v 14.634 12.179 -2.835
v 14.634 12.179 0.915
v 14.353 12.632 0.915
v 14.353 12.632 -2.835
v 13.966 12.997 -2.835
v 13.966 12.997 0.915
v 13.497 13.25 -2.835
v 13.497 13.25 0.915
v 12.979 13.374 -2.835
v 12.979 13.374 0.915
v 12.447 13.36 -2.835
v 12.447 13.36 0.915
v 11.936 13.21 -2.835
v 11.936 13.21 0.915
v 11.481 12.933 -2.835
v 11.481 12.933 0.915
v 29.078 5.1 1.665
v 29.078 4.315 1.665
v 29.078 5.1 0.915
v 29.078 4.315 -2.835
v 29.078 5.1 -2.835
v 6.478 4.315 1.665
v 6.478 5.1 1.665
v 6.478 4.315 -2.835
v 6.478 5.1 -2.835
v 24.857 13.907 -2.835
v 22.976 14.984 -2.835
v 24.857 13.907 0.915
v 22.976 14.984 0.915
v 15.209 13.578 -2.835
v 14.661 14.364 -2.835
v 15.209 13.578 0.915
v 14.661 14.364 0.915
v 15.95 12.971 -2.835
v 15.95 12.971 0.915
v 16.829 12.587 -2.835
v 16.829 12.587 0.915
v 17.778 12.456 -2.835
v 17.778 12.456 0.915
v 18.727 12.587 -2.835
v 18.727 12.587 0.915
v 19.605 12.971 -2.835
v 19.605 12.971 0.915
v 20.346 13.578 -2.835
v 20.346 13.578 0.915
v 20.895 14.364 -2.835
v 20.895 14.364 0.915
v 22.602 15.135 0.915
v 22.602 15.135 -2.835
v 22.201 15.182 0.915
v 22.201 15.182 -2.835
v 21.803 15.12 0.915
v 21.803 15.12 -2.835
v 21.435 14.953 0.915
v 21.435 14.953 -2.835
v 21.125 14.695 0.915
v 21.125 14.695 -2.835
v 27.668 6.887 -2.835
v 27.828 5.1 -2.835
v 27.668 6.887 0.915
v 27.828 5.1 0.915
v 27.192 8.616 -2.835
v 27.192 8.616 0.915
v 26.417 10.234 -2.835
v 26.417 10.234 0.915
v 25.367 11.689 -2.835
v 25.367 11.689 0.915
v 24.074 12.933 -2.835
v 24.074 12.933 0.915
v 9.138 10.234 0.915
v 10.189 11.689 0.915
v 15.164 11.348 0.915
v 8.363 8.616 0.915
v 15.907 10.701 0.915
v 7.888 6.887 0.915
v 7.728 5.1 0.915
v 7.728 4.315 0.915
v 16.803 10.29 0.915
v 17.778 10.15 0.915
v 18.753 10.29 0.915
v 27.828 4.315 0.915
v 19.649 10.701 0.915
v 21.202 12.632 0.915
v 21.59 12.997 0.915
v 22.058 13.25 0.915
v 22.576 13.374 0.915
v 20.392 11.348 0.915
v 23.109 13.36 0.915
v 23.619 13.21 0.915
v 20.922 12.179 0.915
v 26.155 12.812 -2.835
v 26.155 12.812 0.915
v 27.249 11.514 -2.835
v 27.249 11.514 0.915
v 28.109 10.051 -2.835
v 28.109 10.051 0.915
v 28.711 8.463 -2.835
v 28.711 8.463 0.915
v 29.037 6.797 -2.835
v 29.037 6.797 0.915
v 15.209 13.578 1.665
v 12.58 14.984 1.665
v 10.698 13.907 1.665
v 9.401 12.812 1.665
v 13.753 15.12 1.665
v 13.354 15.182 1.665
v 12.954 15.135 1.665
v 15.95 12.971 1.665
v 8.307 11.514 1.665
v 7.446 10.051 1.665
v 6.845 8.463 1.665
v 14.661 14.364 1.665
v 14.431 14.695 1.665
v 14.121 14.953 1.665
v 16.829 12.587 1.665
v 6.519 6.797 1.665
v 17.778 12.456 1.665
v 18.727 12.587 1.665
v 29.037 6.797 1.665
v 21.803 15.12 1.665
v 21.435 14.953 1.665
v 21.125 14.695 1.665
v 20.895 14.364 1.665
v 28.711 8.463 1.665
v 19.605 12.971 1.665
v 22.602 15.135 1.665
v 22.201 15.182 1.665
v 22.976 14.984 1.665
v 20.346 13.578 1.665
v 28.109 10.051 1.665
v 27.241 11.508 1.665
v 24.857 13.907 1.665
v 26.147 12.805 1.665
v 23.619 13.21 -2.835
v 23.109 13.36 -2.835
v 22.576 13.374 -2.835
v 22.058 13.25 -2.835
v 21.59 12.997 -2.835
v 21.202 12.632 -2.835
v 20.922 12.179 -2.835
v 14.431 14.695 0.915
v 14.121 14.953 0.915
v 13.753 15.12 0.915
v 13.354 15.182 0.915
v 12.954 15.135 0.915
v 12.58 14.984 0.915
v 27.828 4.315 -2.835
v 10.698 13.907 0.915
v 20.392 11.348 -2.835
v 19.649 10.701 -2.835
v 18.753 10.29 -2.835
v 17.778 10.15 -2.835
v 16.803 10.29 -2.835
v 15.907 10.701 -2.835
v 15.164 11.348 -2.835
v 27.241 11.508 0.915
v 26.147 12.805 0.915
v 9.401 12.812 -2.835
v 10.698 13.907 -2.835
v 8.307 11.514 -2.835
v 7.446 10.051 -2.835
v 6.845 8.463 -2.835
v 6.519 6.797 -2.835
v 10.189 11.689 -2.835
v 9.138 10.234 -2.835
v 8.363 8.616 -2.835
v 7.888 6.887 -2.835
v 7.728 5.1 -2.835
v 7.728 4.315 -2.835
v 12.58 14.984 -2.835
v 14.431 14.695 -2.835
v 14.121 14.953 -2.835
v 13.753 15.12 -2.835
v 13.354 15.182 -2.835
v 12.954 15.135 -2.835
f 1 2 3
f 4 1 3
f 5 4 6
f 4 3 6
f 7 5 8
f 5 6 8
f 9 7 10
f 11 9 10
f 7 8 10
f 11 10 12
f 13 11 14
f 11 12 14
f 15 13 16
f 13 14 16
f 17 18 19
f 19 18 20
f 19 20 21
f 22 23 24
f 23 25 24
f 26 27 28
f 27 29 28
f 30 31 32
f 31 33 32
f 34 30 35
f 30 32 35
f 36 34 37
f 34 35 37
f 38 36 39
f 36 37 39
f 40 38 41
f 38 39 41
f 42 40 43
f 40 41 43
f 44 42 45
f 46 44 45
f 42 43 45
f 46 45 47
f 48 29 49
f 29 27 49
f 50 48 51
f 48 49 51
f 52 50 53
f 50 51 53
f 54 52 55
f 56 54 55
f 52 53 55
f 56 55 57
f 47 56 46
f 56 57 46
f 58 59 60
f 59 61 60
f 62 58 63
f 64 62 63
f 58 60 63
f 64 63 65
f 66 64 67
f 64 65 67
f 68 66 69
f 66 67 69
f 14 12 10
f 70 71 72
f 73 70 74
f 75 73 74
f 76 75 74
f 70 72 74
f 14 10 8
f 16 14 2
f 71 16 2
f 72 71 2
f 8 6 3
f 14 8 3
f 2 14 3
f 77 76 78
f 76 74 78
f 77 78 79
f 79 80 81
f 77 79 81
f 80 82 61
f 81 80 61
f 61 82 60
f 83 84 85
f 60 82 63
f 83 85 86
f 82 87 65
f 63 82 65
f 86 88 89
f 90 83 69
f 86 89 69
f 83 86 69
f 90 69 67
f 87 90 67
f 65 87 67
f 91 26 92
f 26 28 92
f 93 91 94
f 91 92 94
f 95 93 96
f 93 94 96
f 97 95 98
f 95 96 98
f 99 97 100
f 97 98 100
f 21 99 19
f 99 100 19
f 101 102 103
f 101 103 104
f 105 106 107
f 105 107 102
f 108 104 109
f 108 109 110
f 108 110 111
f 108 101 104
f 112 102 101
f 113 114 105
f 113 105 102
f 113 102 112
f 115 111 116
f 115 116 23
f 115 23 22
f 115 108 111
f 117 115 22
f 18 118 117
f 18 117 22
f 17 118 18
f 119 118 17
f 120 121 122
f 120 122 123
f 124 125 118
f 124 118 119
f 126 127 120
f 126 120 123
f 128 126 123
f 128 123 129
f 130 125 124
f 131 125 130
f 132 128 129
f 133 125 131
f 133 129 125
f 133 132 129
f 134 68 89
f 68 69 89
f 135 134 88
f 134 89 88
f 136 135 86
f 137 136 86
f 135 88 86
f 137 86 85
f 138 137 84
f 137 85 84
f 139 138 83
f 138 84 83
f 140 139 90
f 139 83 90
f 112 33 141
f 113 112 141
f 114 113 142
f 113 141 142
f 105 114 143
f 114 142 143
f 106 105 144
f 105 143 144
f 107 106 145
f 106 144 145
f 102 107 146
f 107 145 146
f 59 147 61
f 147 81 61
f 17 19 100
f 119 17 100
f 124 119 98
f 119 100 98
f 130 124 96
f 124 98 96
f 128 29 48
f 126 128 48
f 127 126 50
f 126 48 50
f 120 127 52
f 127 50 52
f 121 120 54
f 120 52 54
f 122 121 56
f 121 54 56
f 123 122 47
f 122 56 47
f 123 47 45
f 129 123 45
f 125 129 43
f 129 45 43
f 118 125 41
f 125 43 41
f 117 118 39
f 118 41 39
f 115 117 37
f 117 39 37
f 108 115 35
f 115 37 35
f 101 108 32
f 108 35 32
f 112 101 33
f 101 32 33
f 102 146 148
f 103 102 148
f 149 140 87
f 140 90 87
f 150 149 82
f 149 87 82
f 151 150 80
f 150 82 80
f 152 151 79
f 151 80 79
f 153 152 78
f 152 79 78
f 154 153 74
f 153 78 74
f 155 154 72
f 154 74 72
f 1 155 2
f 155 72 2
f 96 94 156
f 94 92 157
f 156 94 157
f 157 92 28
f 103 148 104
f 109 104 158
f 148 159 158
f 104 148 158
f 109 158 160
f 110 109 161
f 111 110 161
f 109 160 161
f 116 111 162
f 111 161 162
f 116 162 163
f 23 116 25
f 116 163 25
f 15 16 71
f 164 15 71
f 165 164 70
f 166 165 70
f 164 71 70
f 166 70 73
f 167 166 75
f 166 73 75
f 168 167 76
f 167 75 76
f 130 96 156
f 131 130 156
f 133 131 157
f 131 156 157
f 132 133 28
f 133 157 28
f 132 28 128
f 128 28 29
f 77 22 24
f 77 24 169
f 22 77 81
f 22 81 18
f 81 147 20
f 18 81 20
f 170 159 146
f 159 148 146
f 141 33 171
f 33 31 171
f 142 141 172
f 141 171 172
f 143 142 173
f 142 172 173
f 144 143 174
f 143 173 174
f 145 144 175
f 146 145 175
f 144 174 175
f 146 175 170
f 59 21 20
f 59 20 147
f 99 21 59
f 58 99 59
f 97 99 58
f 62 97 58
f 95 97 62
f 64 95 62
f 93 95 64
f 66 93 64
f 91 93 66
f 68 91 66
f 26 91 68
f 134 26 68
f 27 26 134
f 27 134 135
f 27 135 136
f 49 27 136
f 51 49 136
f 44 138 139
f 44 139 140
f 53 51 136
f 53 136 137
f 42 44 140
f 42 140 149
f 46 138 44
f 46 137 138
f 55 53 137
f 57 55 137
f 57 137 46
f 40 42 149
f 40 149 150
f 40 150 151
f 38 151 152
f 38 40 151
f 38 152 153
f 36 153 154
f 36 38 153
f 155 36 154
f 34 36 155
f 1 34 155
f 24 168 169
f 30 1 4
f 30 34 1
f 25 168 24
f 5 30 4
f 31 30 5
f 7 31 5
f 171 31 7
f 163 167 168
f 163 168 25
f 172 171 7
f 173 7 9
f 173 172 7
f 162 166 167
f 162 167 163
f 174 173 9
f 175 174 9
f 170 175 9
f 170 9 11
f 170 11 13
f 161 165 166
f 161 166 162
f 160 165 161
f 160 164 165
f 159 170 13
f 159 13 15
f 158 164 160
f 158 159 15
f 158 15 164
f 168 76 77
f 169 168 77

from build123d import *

# Parameters (mm, degrees)
BOSS_EXTRUDE1_DEPTH      = 0.915069
BOSS_EXTRUDE1_DEPTH_BACK = 2.834931
FILLET1_R                = 1.5
BOSS_EXTRUDE2_DEPTH      = 0.75


with BuildPart() as part:
    # Sketch1 → Boss-Extrude1 (new body, two sides)
    with BuildSketch(Plane.XY) as boss_extrude1_sk:
        with BuildLine():
            Line((7.72784891, 5.099738578), (7.72784891, 4.315453477))
            Line((7.72784891, 4.315453477), (6.47784891, 4.315453477))
            Line((6.47784891, 4.315453477), (6.47784891, 5.099738578))
            ThreePointArc((6.47784891, 5.099738578), (7.446291457, 10.050539659), (10.698263175, 13.90709152))
            Line((10.698263175, 13.90709152), (14.27784891, 15.955670445))
            ThreePointArc((14.27784891, 15.955670445), (17.77784891, 12.455670445), (21.27784891, 15.955670445))
            Line((21.27784891, 15.955670445), (24.857434644, 13.90709152))
            ThreePointArc((24.857434644, 13.90709152), (28.109406362, 10.050539659), (29.07784891, 5.099738578))
            Line((29.07784891, 5.099738578), (29.07784891, 4.315453477))
            Line((29.07784891, 4.315453477), (27.82784891, 4.315453477))
            Line((27.82784891, 4.315453477), (27.82784891, 5.099738578))
            ThreePointArc((27.82784891, 5.099738578), (26.841010044, 9.442734118), (24.074294629, 12.932826814))
            ThreePointArc((24.074294629, 12.932826814), (22.313278152, 13.328845303), (20.921800097, 12.179150343))
            ThreePointArc((20.921800097, 12.179150343), (17.77784891, 10.149738578), (14.633897723, 12.179150343))
            ThreePointArc((14.633897723, 12.179150343), (13.242419668, 13.328845303), (11.48140319, 12.932826814))
            ThreePointArc((11.48140319, 12.932826814), (8.714687776, 9.442734118), (7.72784891, 5.099738578))
        make_face()
    extrude(amount=BOSS_EXTRUDE1_DEPTH)
    extrude(boss_extrude1_sk.sketch, amount=-BOSS_EXTRUDE1_DEPTH_BACK)

    # Fillet1
    fillet1_edges = [part.edges().sort_by_distance(p)[0] for p in [
        (21.27784891, 15.955670445, -0.959931),
        (14.27784891, 15.955670445, -0.959931),
    ]]
    fillet(fillet1_edges, radius=FILLET1_R)

    # Sketch3 → Boss-Extrude2 (add)
    with BuildSketch(Plane.XY.offset(0.915069038)):
        with BuildLine():
            Line((12.579684297, 14.983819371), (10.698263175, 13.90709152))
            ThreePointArc((10.698263175, 13.90709152), (7.446291457, 10.050539659), (6.47784891, 5.099738578))
            Line((6.47784891, 5.099738578), (6.47784891, 4.315453477))
            Line((6.47784891, 4.315453477), (29.07784891, 4.315453477))
            Line((29.07784891, 4.315453477), (29.07784891, 5.099738578))
            ThreePointArc((29.07784891, 5.099738578), (28.909313649, 7.636891502), (28.109406362, 10.050539659))
            ThreePointArc((28.109406362, 10.050539659), (26.72021242, 12.178486343), (24.857434644, 13.90709152))
            Line((24.857434644, 13.90709152), (22.976013523, 14.983819371))
            ThreePointArc((22.976013523, 14.983819371), (21.80280977, 15.119540101), (20.895023154, 14.364059709))
            ThreePointArc((20.895023154, 14.364059709), (17.77784891, 12.455670445), (14.660674666, 14.364059709))
            ThreePointArc((14.660674666, 14.364059709), (13.75288805, 15.119540101), (12.579684297, 14.983819371))
        make_face()
    extrude(amount=BOSS_EXTRUDE2_DEPTH)


solid = part.part
